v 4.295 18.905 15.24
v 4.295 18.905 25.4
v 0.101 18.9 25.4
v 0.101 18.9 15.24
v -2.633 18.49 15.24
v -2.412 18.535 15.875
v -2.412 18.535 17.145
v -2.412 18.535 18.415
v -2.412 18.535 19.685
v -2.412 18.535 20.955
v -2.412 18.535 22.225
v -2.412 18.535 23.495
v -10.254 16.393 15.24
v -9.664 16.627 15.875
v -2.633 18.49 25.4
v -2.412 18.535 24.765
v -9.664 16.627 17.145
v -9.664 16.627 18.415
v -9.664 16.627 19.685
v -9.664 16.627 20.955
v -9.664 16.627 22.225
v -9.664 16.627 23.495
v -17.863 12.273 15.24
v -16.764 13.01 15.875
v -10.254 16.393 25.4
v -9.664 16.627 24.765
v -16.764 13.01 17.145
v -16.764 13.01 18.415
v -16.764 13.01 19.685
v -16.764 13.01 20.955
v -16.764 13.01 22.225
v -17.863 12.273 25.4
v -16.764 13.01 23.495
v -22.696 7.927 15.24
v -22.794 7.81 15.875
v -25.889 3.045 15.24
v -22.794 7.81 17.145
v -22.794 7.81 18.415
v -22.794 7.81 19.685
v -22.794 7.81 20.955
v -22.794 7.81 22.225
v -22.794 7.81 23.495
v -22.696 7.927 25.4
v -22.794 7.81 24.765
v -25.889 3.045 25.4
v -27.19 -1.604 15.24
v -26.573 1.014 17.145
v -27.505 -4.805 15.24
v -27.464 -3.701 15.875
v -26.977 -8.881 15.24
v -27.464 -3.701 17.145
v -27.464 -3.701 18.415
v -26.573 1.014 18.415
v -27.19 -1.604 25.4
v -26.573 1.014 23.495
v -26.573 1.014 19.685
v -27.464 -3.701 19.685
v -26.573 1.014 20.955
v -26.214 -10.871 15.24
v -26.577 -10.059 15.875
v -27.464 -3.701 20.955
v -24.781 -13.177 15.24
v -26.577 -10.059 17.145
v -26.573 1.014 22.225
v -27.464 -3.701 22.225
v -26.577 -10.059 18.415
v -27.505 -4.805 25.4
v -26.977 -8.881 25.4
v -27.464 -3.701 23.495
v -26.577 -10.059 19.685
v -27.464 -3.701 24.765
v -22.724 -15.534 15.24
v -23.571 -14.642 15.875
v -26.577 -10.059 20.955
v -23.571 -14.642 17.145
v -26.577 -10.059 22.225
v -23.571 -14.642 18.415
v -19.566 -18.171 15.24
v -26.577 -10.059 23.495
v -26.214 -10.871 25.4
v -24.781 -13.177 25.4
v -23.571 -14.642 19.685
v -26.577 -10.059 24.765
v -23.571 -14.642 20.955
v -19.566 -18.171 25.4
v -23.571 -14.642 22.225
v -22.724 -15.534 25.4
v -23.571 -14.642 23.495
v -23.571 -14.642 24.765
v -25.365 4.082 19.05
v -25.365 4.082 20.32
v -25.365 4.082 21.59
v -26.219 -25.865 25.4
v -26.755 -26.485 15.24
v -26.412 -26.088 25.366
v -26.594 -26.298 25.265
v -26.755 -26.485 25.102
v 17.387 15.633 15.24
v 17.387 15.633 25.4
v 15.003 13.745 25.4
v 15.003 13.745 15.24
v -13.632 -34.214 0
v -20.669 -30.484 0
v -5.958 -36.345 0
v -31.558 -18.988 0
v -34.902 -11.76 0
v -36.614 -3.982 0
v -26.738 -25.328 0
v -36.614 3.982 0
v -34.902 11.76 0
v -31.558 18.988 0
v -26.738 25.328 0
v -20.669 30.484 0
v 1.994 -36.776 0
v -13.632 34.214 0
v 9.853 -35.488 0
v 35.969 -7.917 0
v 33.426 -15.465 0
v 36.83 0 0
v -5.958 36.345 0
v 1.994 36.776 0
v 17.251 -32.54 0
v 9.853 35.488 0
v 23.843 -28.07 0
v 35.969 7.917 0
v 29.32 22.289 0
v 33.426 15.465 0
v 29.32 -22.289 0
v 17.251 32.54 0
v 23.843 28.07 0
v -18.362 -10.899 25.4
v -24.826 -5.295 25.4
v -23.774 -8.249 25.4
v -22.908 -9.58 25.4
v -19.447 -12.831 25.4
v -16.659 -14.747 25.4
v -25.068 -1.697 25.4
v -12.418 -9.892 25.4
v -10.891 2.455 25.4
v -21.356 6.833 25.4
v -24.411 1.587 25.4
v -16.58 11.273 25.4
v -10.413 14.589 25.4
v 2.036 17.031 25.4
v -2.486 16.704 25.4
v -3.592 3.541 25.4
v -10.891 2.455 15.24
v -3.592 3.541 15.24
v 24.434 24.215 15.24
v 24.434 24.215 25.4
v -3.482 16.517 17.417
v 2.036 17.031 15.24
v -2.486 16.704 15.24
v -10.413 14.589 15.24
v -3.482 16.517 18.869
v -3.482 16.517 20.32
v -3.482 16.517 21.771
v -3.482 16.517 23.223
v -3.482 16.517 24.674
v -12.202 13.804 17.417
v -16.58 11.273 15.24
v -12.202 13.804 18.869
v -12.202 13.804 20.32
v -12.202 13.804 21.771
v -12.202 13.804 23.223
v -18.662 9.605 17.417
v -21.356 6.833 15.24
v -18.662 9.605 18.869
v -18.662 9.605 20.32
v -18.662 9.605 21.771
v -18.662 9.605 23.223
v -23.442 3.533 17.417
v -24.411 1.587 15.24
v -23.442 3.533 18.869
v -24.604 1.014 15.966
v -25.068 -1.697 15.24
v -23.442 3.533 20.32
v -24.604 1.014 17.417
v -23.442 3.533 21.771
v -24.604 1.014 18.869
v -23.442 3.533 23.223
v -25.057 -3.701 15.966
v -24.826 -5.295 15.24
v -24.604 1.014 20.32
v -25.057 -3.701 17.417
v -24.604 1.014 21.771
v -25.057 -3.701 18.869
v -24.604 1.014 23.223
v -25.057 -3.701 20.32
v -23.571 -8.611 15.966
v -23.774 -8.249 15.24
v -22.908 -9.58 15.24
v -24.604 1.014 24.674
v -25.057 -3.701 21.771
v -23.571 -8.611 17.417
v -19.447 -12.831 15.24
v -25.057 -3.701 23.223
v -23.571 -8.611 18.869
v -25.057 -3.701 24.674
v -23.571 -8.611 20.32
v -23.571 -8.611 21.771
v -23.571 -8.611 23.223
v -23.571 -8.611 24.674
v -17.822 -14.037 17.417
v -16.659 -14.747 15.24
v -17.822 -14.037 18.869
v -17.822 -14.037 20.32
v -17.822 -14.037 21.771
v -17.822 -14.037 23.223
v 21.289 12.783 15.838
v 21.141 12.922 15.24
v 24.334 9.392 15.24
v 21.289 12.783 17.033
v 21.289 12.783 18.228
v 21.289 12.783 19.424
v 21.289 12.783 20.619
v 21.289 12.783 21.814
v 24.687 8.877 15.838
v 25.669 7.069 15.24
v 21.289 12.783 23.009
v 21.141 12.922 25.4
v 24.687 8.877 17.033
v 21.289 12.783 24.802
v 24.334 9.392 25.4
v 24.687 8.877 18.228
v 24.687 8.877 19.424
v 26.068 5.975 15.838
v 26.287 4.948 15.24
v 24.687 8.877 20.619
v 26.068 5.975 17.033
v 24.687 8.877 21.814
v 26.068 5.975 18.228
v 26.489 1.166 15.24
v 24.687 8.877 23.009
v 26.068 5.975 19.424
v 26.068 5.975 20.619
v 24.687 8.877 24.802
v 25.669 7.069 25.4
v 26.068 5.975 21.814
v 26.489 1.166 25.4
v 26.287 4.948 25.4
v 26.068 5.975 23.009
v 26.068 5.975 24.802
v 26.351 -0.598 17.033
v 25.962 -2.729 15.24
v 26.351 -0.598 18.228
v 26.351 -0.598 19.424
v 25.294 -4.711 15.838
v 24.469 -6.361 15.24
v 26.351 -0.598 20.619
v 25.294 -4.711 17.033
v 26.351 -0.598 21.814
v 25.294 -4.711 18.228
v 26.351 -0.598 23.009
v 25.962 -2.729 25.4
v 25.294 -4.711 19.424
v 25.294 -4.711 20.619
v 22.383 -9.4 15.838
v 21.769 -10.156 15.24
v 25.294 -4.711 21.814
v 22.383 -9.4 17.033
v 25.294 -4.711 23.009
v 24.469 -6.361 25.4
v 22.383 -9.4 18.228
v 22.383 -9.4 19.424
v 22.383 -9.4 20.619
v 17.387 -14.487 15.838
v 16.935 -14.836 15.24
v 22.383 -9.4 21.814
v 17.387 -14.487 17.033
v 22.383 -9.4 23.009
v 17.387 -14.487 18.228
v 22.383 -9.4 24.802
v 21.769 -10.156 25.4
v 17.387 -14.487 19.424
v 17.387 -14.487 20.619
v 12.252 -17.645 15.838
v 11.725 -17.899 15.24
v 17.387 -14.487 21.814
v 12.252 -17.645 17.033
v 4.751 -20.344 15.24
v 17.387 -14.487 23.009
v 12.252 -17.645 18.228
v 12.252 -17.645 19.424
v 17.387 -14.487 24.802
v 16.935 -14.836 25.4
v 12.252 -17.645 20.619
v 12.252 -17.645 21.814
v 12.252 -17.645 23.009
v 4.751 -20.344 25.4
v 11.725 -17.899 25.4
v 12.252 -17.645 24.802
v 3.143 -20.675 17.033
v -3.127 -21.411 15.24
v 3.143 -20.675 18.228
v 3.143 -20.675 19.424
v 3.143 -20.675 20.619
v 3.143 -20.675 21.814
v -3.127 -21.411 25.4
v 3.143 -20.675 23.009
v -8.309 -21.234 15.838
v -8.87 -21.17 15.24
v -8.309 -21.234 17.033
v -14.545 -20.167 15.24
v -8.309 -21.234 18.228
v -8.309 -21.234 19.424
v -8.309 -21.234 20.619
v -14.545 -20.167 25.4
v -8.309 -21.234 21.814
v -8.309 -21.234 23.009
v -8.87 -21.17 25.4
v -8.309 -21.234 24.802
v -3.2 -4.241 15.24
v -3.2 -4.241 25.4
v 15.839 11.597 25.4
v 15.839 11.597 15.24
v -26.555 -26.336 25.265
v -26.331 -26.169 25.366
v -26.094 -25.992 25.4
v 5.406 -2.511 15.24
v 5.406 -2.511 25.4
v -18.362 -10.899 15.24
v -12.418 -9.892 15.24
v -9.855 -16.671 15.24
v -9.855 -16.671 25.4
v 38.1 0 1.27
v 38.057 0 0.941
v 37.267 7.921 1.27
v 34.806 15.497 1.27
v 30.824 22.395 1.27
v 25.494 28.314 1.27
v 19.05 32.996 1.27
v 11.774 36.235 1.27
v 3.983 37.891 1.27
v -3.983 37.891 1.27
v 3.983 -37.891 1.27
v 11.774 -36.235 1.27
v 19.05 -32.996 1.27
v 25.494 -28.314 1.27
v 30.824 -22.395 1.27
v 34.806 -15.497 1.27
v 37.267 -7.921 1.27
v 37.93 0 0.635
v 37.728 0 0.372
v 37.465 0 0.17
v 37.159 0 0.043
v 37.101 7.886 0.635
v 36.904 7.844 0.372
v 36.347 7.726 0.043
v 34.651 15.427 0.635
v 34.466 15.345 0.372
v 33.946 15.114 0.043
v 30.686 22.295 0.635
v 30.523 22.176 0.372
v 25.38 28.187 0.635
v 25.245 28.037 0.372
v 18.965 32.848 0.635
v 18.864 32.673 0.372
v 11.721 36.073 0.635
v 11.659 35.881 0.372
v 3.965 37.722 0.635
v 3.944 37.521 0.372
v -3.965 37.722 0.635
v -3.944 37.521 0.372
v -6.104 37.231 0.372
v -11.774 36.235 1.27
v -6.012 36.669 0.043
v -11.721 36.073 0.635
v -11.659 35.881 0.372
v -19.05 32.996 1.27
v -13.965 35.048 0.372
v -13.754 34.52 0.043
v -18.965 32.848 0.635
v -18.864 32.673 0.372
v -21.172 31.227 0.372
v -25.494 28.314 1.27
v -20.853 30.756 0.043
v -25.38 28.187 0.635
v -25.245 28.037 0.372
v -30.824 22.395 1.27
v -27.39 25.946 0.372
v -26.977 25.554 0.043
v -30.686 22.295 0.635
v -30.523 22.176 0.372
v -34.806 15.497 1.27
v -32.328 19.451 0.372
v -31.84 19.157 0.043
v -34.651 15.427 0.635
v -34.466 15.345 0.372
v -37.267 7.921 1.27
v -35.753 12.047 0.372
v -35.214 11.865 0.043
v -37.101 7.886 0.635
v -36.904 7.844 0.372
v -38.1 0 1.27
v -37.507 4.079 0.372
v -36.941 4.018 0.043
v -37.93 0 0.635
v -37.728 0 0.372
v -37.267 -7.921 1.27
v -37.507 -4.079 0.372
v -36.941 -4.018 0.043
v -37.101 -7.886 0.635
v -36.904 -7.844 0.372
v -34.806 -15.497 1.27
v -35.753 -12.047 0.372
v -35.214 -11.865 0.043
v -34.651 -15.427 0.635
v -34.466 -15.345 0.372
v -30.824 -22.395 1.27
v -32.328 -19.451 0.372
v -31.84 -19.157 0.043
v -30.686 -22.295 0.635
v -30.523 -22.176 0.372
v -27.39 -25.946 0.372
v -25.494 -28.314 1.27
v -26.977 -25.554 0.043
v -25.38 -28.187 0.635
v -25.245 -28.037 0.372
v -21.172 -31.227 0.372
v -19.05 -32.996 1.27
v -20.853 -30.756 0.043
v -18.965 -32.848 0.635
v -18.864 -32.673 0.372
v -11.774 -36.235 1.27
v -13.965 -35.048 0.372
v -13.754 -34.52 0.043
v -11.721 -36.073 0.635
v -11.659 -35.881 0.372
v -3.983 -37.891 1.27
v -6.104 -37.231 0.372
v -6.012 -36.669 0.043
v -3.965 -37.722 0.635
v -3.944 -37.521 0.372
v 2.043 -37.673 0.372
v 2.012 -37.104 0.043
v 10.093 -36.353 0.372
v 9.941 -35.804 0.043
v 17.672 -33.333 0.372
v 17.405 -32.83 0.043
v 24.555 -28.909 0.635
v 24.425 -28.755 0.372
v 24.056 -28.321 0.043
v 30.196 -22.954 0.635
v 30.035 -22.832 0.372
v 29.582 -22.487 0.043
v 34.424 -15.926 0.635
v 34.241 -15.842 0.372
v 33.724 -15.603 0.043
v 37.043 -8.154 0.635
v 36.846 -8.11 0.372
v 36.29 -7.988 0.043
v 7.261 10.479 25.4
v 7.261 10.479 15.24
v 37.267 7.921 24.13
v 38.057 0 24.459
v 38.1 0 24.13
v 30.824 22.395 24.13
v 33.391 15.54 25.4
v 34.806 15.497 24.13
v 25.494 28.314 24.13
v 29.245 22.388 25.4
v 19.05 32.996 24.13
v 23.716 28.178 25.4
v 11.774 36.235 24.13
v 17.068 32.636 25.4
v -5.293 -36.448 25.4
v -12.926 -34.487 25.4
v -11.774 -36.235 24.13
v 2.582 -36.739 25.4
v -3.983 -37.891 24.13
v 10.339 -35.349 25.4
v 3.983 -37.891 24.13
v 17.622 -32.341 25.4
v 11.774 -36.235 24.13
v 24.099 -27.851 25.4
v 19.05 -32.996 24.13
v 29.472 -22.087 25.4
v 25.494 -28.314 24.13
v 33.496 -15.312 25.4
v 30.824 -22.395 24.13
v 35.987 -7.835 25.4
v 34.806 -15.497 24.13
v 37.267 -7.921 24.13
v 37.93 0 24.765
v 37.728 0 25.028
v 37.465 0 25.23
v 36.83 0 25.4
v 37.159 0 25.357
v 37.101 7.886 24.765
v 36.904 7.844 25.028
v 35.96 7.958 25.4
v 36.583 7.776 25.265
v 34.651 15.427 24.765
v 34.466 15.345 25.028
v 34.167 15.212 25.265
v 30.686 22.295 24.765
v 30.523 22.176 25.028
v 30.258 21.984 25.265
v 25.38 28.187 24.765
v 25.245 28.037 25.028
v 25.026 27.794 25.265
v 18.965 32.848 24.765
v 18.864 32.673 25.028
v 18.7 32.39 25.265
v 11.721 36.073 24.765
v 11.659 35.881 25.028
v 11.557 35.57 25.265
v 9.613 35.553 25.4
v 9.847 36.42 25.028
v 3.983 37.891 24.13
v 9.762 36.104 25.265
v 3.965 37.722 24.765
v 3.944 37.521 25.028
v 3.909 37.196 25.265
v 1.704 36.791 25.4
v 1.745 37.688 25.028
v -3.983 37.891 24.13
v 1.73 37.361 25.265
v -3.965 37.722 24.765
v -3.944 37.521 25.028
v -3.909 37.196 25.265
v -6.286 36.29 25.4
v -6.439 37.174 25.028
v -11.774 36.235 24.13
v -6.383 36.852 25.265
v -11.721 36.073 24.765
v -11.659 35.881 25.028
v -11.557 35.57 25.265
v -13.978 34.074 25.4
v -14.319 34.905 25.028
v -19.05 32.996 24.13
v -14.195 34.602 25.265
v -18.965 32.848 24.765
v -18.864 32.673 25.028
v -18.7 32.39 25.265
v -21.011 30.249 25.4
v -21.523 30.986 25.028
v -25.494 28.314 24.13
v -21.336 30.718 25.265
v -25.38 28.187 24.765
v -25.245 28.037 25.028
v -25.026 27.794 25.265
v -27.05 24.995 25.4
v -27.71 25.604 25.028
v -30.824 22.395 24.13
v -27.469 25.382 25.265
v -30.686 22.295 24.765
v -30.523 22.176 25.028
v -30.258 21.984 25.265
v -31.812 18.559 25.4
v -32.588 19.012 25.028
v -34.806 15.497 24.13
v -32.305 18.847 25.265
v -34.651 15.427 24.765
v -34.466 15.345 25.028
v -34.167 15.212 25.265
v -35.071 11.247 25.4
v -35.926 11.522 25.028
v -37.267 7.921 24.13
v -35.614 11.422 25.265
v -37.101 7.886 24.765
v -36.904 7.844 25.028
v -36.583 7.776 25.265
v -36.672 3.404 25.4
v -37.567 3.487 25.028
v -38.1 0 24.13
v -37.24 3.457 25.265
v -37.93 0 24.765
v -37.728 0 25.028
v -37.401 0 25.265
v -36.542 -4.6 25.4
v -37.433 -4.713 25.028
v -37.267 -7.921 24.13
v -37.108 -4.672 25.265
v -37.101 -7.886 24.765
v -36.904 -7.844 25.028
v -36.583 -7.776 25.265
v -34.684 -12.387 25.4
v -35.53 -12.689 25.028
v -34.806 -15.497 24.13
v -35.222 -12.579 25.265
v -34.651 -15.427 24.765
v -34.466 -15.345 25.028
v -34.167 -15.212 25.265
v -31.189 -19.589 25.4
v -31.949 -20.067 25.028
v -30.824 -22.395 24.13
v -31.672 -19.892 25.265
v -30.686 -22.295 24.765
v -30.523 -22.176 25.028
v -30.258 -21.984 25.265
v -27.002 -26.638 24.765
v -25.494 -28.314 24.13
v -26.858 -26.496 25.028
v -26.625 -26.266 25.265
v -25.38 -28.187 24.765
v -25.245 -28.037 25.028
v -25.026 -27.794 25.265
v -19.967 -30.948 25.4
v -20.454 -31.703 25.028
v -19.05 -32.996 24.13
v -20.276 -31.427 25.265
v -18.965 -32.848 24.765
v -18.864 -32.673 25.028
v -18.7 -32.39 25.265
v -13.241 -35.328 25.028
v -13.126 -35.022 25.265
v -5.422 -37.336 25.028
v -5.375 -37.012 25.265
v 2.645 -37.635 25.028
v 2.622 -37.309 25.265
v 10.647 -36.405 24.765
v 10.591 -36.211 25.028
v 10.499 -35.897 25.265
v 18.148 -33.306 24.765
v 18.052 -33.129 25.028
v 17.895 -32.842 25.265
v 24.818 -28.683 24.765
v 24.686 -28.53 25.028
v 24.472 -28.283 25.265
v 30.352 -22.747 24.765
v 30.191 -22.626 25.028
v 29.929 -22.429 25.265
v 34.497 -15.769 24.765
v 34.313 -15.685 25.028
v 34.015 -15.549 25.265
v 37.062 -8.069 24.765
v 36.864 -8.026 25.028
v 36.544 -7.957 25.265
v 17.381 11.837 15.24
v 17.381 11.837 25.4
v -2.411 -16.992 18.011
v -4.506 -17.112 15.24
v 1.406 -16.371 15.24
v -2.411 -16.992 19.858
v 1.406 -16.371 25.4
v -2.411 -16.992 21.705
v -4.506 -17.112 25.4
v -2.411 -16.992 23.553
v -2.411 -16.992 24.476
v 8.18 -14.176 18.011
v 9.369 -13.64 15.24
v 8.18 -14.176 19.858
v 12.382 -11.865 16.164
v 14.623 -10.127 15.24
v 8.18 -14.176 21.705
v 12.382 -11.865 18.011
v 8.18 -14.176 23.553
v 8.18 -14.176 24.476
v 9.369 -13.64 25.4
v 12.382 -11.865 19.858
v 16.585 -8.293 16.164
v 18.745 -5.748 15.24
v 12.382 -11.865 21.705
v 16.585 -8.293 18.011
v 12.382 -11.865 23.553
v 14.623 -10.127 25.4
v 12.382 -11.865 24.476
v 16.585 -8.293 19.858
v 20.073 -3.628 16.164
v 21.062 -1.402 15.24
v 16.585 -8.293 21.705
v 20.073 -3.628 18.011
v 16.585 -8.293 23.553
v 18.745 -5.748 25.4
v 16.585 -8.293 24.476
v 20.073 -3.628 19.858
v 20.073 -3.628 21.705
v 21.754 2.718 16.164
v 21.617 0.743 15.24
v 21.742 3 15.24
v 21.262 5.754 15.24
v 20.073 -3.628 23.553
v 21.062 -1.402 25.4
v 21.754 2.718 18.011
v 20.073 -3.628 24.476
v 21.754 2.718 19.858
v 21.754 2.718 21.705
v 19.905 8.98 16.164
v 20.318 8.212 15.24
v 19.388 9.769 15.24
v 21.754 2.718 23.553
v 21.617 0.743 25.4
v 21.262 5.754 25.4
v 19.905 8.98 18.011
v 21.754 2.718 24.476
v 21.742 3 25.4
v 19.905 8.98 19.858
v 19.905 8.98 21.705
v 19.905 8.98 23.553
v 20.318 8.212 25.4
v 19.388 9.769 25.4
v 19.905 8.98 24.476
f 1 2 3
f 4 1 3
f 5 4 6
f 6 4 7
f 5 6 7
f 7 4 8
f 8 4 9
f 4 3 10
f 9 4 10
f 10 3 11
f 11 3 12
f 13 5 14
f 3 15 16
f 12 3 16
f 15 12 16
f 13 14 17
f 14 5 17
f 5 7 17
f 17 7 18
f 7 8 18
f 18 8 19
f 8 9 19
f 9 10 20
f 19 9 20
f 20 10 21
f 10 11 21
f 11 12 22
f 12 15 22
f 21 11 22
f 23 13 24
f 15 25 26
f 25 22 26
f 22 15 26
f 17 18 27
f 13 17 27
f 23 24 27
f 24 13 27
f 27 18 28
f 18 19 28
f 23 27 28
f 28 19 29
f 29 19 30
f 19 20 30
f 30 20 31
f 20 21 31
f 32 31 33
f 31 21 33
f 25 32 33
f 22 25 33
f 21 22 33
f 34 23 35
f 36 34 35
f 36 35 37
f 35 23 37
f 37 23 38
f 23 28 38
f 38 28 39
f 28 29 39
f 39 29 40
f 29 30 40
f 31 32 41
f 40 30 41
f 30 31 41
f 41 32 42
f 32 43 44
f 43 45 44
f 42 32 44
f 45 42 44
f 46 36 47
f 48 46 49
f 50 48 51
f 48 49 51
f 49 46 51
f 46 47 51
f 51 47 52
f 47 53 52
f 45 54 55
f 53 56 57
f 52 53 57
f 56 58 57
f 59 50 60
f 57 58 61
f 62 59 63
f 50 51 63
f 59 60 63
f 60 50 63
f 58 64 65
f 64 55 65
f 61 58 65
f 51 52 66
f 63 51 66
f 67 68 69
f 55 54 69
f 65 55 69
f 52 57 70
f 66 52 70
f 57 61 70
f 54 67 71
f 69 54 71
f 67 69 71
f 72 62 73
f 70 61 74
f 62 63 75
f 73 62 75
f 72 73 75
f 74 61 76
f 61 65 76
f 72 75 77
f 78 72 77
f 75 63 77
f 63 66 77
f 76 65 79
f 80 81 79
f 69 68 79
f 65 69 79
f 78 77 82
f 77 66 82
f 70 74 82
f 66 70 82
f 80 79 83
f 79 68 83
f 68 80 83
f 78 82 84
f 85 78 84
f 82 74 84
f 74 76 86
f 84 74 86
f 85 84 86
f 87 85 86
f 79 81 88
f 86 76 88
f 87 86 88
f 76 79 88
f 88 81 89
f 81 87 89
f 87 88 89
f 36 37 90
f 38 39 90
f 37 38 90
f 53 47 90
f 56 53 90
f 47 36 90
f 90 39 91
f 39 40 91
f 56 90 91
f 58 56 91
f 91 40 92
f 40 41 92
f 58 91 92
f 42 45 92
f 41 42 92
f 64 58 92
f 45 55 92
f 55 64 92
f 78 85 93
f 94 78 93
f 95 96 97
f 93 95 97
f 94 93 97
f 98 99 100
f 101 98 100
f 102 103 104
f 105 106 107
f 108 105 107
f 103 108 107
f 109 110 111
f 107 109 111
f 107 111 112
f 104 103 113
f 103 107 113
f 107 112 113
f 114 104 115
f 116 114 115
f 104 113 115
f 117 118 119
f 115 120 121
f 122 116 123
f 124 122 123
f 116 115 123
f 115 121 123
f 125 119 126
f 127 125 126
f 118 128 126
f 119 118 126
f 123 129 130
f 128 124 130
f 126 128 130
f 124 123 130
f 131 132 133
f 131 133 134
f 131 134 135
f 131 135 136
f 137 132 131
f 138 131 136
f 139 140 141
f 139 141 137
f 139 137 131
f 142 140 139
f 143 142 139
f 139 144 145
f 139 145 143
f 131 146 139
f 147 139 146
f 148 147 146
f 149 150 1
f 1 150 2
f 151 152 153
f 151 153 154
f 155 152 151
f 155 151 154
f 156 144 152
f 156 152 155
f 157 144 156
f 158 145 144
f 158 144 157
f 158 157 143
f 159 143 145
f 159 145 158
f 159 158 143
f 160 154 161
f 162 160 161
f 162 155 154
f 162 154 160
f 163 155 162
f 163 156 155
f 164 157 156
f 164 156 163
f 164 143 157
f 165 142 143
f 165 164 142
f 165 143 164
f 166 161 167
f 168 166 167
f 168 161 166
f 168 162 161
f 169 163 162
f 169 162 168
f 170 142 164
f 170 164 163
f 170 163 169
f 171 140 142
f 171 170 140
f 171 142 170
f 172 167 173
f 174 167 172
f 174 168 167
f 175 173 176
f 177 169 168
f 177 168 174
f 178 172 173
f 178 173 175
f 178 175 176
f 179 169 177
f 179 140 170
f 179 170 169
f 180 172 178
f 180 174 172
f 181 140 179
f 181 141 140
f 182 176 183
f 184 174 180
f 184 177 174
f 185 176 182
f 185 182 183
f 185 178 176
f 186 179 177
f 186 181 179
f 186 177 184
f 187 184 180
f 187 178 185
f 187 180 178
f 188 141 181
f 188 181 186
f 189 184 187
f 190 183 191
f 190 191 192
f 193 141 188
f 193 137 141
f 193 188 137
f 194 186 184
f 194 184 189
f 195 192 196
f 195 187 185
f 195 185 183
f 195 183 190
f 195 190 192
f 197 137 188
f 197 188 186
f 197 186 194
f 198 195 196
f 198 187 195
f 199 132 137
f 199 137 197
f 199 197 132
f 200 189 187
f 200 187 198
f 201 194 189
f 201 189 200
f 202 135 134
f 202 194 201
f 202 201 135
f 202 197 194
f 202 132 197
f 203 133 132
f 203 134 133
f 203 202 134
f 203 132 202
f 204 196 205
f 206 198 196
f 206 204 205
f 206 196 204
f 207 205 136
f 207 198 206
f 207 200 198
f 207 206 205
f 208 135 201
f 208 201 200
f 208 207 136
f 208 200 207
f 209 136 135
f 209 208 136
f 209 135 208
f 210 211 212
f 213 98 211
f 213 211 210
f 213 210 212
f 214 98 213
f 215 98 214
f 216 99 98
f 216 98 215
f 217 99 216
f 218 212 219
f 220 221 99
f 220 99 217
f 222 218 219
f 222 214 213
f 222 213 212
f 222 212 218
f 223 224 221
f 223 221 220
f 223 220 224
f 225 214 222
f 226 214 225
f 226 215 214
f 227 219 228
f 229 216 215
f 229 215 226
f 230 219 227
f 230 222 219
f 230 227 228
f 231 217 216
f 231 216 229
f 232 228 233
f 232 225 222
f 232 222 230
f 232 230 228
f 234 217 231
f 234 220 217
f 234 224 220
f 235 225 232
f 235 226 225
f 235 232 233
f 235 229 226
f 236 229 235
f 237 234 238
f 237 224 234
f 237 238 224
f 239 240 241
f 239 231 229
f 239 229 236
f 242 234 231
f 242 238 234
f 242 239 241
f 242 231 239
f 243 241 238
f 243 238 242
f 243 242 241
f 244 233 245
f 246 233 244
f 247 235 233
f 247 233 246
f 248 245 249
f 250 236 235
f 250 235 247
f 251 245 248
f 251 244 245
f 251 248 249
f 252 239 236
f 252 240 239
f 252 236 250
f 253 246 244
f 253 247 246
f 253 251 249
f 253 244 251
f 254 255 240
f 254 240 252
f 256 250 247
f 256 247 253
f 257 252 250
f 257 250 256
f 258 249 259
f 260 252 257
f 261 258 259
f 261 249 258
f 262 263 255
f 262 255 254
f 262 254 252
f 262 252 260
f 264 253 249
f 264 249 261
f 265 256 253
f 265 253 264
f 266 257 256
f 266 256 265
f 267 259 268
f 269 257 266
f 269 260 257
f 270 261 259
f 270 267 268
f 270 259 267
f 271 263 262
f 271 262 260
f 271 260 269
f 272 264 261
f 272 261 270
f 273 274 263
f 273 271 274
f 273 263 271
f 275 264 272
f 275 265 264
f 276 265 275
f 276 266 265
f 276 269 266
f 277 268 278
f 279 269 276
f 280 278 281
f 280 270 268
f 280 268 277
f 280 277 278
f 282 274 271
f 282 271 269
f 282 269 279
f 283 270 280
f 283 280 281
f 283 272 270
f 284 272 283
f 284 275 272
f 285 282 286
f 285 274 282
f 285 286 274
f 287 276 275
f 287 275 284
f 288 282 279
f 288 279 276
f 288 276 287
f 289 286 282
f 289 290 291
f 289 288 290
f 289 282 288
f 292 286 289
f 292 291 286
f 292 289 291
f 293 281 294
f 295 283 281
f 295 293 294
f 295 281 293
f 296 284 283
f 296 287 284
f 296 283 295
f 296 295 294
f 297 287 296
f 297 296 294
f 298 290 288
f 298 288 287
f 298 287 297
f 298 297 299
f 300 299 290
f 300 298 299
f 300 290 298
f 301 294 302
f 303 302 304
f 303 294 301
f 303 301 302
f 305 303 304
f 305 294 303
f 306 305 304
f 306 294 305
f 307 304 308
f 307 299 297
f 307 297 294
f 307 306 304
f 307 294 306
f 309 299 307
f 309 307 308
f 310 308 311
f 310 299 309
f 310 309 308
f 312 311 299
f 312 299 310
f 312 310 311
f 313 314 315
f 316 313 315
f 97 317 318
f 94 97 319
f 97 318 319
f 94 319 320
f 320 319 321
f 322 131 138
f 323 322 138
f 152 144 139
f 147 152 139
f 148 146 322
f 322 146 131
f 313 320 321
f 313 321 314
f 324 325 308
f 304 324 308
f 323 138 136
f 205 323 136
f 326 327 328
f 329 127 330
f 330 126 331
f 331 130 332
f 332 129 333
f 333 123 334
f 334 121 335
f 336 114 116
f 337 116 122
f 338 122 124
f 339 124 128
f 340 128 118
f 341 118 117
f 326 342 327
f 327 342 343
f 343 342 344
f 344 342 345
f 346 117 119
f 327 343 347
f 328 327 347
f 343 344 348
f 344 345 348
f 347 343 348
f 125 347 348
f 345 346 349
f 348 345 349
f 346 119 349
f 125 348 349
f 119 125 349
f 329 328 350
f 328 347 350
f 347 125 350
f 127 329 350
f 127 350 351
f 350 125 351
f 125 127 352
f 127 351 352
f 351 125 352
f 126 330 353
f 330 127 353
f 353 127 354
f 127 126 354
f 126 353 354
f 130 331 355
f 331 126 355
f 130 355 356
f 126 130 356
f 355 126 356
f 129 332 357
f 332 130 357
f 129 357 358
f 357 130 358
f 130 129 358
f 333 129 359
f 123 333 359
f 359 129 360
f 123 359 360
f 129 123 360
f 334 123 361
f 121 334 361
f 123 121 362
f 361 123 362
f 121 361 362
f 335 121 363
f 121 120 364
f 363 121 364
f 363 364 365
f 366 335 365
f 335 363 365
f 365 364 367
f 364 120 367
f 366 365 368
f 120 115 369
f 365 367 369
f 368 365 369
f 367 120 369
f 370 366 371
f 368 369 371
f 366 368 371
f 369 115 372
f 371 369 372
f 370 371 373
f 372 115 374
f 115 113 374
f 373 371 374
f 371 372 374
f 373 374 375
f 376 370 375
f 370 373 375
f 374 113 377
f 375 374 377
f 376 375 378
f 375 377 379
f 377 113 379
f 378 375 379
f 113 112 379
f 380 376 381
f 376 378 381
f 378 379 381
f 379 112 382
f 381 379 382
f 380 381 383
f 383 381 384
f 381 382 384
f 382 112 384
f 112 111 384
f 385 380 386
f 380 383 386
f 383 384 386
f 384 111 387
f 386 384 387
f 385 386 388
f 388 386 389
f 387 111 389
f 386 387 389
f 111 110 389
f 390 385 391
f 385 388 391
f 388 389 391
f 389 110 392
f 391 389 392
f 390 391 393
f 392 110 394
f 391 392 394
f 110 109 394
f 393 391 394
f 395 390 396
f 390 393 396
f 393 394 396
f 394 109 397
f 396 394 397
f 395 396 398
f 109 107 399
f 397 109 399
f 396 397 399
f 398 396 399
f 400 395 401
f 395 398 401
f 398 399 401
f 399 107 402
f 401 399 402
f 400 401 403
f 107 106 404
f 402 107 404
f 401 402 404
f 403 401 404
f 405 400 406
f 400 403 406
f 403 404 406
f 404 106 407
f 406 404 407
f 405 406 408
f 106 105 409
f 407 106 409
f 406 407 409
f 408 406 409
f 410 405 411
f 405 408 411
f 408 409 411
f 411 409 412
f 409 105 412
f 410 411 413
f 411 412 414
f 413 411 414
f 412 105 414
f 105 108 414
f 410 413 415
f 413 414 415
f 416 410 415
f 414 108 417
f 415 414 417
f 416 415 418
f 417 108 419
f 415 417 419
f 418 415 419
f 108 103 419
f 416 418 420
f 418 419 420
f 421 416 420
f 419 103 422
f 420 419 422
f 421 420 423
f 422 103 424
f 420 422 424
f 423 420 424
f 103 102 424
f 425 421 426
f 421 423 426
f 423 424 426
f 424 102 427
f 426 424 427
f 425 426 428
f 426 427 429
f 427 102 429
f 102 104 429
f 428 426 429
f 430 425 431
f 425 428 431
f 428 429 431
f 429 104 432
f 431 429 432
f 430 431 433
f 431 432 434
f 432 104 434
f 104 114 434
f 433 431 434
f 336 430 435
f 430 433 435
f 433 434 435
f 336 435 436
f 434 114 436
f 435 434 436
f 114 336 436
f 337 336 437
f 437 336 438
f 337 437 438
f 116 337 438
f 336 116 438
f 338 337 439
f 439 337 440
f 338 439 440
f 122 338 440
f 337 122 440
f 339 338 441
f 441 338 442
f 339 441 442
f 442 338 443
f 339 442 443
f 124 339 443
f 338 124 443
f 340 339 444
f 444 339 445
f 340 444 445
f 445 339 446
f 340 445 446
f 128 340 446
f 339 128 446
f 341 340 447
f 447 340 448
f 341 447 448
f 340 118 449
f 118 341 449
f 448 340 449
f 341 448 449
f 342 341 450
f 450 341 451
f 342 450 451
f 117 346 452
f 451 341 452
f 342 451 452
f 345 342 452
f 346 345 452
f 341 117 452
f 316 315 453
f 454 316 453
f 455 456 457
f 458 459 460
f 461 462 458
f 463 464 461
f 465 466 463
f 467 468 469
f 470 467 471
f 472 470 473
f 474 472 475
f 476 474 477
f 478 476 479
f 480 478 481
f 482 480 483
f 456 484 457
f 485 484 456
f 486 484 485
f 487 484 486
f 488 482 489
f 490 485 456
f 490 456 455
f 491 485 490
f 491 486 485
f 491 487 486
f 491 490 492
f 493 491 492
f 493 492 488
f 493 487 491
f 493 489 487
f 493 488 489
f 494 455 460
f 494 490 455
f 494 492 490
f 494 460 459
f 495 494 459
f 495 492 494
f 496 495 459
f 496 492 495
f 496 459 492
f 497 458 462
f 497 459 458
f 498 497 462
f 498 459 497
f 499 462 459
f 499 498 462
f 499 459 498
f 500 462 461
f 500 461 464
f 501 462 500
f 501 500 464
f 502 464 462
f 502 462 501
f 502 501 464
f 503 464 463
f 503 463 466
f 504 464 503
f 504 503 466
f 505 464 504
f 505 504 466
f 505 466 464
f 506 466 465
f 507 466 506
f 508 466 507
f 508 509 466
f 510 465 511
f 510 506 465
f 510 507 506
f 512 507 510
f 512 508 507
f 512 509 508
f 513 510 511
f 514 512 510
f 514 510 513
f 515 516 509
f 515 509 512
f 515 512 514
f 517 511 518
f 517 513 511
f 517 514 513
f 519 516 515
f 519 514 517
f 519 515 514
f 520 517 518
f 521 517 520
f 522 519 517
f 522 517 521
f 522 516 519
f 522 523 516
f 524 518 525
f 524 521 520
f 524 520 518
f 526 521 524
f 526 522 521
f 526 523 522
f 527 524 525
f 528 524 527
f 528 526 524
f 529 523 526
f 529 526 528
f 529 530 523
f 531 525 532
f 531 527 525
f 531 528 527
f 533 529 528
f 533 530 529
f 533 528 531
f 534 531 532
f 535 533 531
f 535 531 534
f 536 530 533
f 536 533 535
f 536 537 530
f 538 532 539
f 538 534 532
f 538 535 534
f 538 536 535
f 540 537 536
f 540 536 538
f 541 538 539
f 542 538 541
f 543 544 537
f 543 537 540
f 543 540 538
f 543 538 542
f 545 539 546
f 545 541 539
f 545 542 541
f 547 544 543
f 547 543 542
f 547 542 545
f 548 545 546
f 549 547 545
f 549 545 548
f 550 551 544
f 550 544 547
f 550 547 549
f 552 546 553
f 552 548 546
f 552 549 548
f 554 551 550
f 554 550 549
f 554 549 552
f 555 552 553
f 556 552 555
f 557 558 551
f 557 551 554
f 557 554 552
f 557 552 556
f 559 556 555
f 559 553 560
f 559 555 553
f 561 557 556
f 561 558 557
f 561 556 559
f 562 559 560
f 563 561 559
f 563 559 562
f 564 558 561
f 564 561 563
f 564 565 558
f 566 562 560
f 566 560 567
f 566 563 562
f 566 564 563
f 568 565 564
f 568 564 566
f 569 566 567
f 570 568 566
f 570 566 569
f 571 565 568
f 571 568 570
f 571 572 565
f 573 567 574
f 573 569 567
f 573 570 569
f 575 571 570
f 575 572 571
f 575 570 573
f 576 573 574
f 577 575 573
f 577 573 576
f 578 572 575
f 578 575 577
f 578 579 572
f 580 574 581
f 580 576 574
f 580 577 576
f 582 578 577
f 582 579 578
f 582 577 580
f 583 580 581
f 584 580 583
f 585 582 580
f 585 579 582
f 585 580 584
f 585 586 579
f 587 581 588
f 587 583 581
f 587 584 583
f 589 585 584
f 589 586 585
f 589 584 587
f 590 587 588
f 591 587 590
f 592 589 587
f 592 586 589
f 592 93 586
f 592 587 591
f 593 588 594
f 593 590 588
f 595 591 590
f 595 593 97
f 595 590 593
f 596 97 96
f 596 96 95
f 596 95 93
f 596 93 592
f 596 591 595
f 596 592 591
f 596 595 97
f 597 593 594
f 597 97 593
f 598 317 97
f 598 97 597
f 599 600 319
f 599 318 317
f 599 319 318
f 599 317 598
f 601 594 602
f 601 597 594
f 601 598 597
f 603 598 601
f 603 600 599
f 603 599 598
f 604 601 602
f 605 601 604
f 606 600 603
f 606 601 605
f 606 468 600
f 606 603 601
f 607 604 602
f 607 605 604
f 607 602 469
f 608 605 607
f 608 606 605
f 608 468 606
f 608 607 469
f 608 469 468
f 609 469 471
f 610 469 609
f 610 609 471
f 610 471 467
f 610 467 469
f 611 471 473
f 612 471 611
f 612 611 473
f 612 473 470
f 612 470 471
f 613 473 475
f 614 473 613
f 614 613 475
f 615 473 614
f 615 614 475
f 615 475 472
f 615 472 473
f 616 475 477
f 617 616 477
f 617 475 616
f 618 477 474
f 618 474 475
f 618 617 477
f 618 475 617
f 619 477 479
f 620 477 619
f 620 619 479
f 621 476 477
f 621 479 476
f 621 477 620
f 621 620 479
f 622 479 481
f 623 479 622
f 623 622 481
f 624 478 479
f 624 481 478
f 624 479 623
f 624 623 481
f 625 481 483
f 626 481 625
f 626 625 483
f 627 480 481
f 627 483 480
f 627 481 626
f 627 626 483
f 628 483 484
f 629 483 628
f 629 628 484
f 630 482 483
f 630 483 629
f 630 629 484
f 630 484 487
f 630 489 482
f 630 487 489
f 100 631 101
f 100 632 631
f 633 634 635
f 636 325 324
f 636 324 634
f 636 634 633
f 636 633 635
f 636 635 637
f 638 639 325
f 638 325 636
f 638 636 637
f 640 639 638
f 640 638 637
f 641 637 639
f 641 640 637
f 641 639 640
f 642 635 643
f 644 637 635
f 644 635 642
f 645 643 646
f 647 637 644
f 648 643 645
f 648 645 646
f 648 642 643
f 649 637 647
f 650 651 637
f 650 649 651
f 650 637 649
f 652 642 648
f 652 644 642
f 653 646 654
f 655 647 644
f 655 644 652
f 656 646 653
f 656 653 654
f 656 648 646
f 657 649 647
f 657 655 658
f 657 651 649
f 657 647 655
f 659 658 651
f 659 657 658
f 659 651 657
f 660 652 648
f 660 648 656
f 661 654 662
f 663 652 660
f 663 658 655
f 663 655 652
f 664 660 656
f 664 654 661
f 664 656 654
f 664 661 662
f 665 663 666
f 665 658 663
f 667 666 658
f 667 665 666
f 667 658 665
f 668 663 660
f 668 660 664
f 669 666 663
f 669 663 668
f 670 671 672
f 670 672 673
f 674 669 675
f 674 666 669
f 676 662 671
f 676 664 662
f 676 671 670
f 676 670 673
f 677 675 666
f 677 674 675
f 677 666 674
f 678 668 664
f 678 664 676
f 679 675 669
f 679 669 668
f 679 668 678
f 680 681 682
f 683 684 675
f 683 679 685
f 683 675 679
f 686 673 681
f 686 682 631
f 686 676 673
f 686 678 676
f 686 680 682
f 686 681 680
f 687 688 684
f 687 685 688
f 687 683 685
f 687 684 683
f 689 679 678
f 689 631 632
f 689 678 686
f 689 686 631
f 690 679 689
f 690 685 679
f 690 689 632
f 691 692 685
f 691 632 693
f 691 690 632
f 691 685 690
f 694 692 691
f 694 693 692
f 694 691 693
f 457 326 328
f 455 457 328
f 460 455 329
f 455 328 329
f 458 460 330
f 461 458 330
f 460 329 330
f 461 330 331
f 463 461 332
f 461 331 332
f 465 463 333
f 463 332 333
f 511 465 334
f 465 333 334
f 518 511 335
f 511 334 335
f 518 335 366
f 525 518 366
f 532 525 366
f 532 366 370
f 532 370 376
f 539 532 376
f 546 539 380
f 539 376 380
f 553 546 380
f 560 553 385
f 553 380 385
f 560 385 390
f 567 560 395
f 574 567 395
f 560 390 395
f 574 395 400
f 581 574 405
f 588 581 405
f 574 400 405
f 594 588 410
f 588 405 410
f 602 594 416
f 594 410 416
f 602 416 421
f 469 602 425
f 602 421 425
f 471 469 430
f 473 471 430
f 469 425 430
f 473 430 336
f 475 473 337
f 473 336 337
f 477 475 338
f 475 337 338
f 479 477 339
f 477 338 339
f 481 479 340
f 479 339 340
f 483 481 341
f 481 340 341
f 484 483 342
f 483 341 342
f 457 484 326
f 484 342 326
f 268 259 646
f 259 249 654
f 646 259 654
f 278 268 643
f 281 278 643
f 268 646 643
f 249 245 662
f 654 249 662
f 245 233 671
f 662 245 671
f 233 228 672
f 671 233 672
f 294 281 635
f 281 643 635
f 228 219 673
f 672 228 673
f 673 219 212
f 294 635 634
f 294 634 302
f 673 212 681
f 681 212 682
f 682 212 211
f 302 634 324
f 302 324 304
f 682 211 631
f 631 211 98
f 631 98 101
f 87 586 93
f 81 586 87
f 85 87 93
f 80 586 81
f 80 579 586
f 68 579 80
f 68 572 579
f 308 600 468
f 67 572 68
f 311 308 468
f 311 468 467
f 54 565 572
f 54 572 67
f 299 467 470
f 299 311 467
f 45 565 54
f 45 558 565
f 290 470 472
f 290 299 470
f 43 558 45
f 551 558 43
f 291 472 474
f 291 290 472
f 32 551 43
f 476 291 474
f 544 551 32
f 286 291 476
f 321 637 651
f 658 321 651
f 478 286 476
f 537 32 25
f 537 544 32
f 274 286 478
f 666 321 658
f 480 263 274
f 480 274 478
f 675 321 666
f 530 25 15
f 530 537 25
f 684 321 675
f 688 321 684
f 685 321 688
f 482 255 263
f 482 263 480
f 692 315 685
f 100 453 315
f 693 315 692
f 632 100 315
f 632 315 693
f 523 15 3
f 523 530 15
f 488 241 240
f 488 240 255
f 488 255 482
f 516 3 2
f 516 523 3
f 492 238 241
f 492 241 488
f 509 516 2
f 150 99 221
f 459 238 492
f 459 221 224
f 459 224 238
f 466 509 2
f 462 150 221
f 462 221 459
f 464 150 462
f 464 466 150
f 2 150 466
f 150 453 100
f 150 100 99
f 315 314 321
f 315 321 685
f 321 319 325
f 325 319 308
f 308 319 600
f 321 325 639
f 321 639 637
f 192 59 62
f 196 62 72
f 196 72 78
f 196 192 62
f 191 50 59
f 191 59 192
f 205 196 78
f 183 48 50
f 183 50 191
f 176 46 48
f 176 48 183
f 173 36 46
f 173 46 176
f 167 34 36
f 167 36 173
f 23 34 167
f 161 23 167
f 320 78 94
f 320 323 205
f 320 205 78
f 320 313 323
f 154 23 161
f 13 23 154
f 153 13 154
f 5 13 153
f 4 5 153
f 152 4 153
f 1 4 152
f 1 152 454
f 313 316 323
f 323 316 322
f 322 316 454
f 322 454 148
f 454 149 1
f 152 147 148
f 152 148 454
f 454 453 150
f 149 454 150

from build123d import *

# Parameters (mm, degrees)
F0_R     = 38.1
F1_DEPTH = 25.4
F2_R     = 1.27
F4_DEPTH = 10.16


with BuildPart() as f1:
    # F0 (on Top) → F1 (new body)
    with BuildSketch(Plane.XY):
        Circle(F0_R)
    extrude(amount=F1_DEPTH)

    # F2
    f2_edges = [f1.edges().sort_by_distance(p)[0] for p in [
        (-38.1, 0, 25.4),
        (-38.1, 0, 0),
    ]]
    fillet(f2_edges, radius=F2_R)

    # F3 (on face) → F4 (cut)
    with BuildSketch(Plane.XY.offset(25.4)):
        with BuildLine():
            Line((-19.5661182899, -18.1706012091), (-26.7553265637, -26.4851974048))
            Line((-26.7553265637, -26.4851974048), (5.4061874503, -2.5106431912))
            Line((5.4061874503, -2.5106431912), (-3.200049929, -4.2408025526))
            Line((-3.200049929, -4.2408025526), (15.8394873054, 11.5967263231))
            Line((15.8394873054, 11.5967263231), (7.2614595686, 10.4792513123))
            Line((7.2614595686, 10.4792513123), (24.433595378, 24.2147761598))
            Line((24.433595378, 24.2147761598), (4.2949300972, 18.9045294))
            add(Edge.make_bspline(
                [(4.2949300972, 18.9045294), (3.8578868072, 18.9001902263), (2.8255551255, 18.8899407461), (0.0728269951, 18.9879537596), (-2.416985134, 18.5661852441), (-6.4107369283, 17.6468576464), (-9.7123233005, 16.7021829393), (-12.5398092723, 15.3440163882), (-16.8721606771, 13.1040275758), (-19.9007344343, 10.7357054975), (-22.8894463137, 8.0049544035), (-25.8325272327, 3.571514678), (-26.5942743919, 1.0228501359), (-27.8243775869, -3.8193612894), (-27.1445214519, -10.193277819), (-23.7350134876, -14.6357550528), (-21.4008680736, -16.806202139), (-20.1406895566, -17.7433252345), (-19.5661182899, -18.1706012091)],
                knots=[0, 0, 0, 0, 0.0393230905, 0.0928843277, 0.1459402353, 0.2120782925, 0.2727584507, 0.3308515796, 0.40286638, 0.4671851532, 0.533772906, 0.608108541, 0.6617575665, 0.7335395787, 0.8165602186, 0.8932761667, 0.9513398719, 1, 1, 1, 1], degree=3))
        make_face()
        with BuildLine():
            add(Edge.make_bspline(
                [(2.0359272731, 17.0305203597), (1.3954106628, 17.0546042076), (-0.0892415224, 17.1104281111), (-3.5731065553, 16.5502831509), (-8.5082169393, 15.40758038), (-12.1799994257, 13.8781536445), (-15.6913864649, 12.0326267348), (-18.7093375005, 9.6369774455), (-21.4249459198, 7.0615317926), (-23.465217898, 3.5036235622), (-24.8205084542, 1.0789665507), (-25.414591442, -3.8024334011), (-23.9169773543, -8.8156140602), (-20.9006750006, -11.7286450069), (-17.920148096, -14.0343436431), (-17.0053674551, -14.5514987399), (-16.6593735189, -14.7471003077)],
                knots=[0, 0, 0, 0, 0.0533585134, 0.1236795927, 0.2084451349, 0.2836295249, 0.3576121735, 0.4308488556, 0.5037700814, 0.5784669466, 0.6408484233, 0.7223586051, 0.8071746244, 0.8844167139, 0.9562833817, 1, 1, 1, 1], degree=3))
            Line((2.0359272731, 17.0305203597), (-10.8908848154, 2.4554725062))
            Line((-10.8908848154, 2.4554725062), (-3.5924285351, 3.5412959569))
            Line((-3.5924285351, 3.5412959569), (-18.3622744366, -10.8986072092))
            Line((-18.3622744366, -10.8986072092), (-12.4181416451, -9.8916973697))
            Line((-12.4181416451, -9.8916973697), (-16.6593735189, -14.7471003077))
        make_face(mode=Mode.SUBTRACT)
        with BuildLine():
            add(Edge.make_bspline(
                [(17.3873861626, 15.6334186555), (18.0370958634, 15.2589721072), (19.3749563206, 14.4879243151), (21.3265644237, 12.8038361847), (23.0478327612, 10.9995316669), (24.778719369, 8.9559550933), (26.2146688484, 6.1020958965), (26.3979131008, 3.9139763932), (26.5491055591, 2.71825424), (26.4625942606, -0.8082938445), (25.5136962919, -4.8925023756), (22.5000147718, -9.5825463131), (17.5963832254, -14.740520896), (12.3872032479, -17.7055628688), (7.5630660017, -19.7133836725), (3.1258890287, -20.746211478), (-2.1365566408, -21.5172519141), (-8.365474944, -21.4265742118), (-12.4795067403, -20.5878213551), (-14.5448679776, -20.1667435114)],
                knots=[0, 0, 0, 0, 0.0448250287, 0.092302198, 0.1390260415, 0.1877941832, 0.2409788153, 0.2837285607, 0.3160106559, 0.3702840764, 0.4314149985, 0.501108459, 0.5803195518, 0.6531562215, 0.7203239803, 0.783247441, 0.851372124, 0.9253845694, 1, 1, 1, 1], degree=3))
            Line((17.3873861626, 15.6334186555), (15.0031798623, 13.7454713383))
            add(Edge.make_bspline(
                [(-9.8547809612, -16.6705540785), (-8.8513922673, -16.8368529644), (-6.6835445534, -17.1961460894), (-2.2683618168, -17.0786395481), (1.9592718785, -16.373668921), (8.3191866593, -14.3188597994), (12.4218579634, -12.0285396002), (16.7822239361, -8.3732731196), (20.3852473964, -3.7979371357), (22.5516095847, 2.5973484144), (20.2177525614, 9.1228571556), (17.816185371, 11.551632666), (15.9466715379, 13.0096503389), (15.0031798623, 13.7454713383)],
                knots=[0, 0, 0, 0, 0.0734379394, 0.1586646033, 0.2453518248, 0.3507074217, 0.4408496419, 0.5375155853, 0.636853644, 0.7423131031, 0.8474861883, 0.9230305178, 1, 1, 1, 1], degree=3))
            Line((-9.8547809612, -16.6705540785), (-14.5448679776, -20.1667435114))
        make_face()
    extrude(amount=-F4_DEPTH, mode=Mode.SUBTRACT)


solid = f1.part
